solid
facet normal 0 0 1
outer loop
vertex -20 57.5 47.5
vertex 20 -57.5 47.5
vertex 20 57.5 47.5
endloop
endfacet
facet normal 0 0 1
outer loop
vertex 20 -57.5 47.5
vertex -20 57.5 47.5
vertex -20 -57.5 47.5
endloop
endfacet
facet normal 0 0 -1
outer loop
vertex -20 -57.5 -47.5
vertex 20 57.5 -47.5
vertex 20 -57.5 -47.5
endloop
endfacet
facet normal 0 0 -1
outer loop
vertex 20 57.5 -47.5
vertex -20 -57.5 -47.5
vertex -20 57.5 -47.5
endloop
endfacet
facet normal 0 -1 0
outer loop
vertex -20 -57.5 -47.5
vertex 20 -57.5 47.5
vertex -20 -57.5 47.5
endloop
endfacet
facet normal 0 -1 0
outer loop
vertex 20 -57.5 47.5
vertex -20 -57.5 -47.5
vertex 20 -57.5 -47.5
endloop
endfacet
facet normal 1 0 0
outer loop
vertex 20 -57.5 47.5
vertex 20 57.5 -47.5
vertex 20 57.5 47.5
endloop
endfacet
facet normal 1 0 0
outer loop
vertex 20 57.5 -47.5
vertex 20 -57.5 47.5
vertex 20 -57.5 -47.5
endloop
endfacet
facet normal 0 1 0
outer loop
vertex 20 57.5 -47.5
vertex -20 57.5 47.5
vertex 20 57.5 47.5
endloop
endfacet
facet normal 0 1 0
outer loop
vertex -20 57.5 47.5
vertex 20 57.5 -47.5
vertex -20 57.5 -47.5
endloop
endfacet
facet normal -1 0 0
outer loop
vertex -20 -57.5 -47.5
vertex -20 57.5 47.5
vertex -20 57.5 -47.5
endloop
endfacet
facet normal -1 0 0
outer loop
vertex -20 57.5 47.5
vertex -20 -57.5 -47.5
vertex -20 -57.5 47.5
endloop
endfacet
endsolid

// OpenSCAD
// ========================================
// a 40 x 115 x 95 mm box
// NeuroCAD canonical IR; dimensions are millimetres
// ========================================
$fn = 48;

cube(size=[40, 115, 95], center=true);
